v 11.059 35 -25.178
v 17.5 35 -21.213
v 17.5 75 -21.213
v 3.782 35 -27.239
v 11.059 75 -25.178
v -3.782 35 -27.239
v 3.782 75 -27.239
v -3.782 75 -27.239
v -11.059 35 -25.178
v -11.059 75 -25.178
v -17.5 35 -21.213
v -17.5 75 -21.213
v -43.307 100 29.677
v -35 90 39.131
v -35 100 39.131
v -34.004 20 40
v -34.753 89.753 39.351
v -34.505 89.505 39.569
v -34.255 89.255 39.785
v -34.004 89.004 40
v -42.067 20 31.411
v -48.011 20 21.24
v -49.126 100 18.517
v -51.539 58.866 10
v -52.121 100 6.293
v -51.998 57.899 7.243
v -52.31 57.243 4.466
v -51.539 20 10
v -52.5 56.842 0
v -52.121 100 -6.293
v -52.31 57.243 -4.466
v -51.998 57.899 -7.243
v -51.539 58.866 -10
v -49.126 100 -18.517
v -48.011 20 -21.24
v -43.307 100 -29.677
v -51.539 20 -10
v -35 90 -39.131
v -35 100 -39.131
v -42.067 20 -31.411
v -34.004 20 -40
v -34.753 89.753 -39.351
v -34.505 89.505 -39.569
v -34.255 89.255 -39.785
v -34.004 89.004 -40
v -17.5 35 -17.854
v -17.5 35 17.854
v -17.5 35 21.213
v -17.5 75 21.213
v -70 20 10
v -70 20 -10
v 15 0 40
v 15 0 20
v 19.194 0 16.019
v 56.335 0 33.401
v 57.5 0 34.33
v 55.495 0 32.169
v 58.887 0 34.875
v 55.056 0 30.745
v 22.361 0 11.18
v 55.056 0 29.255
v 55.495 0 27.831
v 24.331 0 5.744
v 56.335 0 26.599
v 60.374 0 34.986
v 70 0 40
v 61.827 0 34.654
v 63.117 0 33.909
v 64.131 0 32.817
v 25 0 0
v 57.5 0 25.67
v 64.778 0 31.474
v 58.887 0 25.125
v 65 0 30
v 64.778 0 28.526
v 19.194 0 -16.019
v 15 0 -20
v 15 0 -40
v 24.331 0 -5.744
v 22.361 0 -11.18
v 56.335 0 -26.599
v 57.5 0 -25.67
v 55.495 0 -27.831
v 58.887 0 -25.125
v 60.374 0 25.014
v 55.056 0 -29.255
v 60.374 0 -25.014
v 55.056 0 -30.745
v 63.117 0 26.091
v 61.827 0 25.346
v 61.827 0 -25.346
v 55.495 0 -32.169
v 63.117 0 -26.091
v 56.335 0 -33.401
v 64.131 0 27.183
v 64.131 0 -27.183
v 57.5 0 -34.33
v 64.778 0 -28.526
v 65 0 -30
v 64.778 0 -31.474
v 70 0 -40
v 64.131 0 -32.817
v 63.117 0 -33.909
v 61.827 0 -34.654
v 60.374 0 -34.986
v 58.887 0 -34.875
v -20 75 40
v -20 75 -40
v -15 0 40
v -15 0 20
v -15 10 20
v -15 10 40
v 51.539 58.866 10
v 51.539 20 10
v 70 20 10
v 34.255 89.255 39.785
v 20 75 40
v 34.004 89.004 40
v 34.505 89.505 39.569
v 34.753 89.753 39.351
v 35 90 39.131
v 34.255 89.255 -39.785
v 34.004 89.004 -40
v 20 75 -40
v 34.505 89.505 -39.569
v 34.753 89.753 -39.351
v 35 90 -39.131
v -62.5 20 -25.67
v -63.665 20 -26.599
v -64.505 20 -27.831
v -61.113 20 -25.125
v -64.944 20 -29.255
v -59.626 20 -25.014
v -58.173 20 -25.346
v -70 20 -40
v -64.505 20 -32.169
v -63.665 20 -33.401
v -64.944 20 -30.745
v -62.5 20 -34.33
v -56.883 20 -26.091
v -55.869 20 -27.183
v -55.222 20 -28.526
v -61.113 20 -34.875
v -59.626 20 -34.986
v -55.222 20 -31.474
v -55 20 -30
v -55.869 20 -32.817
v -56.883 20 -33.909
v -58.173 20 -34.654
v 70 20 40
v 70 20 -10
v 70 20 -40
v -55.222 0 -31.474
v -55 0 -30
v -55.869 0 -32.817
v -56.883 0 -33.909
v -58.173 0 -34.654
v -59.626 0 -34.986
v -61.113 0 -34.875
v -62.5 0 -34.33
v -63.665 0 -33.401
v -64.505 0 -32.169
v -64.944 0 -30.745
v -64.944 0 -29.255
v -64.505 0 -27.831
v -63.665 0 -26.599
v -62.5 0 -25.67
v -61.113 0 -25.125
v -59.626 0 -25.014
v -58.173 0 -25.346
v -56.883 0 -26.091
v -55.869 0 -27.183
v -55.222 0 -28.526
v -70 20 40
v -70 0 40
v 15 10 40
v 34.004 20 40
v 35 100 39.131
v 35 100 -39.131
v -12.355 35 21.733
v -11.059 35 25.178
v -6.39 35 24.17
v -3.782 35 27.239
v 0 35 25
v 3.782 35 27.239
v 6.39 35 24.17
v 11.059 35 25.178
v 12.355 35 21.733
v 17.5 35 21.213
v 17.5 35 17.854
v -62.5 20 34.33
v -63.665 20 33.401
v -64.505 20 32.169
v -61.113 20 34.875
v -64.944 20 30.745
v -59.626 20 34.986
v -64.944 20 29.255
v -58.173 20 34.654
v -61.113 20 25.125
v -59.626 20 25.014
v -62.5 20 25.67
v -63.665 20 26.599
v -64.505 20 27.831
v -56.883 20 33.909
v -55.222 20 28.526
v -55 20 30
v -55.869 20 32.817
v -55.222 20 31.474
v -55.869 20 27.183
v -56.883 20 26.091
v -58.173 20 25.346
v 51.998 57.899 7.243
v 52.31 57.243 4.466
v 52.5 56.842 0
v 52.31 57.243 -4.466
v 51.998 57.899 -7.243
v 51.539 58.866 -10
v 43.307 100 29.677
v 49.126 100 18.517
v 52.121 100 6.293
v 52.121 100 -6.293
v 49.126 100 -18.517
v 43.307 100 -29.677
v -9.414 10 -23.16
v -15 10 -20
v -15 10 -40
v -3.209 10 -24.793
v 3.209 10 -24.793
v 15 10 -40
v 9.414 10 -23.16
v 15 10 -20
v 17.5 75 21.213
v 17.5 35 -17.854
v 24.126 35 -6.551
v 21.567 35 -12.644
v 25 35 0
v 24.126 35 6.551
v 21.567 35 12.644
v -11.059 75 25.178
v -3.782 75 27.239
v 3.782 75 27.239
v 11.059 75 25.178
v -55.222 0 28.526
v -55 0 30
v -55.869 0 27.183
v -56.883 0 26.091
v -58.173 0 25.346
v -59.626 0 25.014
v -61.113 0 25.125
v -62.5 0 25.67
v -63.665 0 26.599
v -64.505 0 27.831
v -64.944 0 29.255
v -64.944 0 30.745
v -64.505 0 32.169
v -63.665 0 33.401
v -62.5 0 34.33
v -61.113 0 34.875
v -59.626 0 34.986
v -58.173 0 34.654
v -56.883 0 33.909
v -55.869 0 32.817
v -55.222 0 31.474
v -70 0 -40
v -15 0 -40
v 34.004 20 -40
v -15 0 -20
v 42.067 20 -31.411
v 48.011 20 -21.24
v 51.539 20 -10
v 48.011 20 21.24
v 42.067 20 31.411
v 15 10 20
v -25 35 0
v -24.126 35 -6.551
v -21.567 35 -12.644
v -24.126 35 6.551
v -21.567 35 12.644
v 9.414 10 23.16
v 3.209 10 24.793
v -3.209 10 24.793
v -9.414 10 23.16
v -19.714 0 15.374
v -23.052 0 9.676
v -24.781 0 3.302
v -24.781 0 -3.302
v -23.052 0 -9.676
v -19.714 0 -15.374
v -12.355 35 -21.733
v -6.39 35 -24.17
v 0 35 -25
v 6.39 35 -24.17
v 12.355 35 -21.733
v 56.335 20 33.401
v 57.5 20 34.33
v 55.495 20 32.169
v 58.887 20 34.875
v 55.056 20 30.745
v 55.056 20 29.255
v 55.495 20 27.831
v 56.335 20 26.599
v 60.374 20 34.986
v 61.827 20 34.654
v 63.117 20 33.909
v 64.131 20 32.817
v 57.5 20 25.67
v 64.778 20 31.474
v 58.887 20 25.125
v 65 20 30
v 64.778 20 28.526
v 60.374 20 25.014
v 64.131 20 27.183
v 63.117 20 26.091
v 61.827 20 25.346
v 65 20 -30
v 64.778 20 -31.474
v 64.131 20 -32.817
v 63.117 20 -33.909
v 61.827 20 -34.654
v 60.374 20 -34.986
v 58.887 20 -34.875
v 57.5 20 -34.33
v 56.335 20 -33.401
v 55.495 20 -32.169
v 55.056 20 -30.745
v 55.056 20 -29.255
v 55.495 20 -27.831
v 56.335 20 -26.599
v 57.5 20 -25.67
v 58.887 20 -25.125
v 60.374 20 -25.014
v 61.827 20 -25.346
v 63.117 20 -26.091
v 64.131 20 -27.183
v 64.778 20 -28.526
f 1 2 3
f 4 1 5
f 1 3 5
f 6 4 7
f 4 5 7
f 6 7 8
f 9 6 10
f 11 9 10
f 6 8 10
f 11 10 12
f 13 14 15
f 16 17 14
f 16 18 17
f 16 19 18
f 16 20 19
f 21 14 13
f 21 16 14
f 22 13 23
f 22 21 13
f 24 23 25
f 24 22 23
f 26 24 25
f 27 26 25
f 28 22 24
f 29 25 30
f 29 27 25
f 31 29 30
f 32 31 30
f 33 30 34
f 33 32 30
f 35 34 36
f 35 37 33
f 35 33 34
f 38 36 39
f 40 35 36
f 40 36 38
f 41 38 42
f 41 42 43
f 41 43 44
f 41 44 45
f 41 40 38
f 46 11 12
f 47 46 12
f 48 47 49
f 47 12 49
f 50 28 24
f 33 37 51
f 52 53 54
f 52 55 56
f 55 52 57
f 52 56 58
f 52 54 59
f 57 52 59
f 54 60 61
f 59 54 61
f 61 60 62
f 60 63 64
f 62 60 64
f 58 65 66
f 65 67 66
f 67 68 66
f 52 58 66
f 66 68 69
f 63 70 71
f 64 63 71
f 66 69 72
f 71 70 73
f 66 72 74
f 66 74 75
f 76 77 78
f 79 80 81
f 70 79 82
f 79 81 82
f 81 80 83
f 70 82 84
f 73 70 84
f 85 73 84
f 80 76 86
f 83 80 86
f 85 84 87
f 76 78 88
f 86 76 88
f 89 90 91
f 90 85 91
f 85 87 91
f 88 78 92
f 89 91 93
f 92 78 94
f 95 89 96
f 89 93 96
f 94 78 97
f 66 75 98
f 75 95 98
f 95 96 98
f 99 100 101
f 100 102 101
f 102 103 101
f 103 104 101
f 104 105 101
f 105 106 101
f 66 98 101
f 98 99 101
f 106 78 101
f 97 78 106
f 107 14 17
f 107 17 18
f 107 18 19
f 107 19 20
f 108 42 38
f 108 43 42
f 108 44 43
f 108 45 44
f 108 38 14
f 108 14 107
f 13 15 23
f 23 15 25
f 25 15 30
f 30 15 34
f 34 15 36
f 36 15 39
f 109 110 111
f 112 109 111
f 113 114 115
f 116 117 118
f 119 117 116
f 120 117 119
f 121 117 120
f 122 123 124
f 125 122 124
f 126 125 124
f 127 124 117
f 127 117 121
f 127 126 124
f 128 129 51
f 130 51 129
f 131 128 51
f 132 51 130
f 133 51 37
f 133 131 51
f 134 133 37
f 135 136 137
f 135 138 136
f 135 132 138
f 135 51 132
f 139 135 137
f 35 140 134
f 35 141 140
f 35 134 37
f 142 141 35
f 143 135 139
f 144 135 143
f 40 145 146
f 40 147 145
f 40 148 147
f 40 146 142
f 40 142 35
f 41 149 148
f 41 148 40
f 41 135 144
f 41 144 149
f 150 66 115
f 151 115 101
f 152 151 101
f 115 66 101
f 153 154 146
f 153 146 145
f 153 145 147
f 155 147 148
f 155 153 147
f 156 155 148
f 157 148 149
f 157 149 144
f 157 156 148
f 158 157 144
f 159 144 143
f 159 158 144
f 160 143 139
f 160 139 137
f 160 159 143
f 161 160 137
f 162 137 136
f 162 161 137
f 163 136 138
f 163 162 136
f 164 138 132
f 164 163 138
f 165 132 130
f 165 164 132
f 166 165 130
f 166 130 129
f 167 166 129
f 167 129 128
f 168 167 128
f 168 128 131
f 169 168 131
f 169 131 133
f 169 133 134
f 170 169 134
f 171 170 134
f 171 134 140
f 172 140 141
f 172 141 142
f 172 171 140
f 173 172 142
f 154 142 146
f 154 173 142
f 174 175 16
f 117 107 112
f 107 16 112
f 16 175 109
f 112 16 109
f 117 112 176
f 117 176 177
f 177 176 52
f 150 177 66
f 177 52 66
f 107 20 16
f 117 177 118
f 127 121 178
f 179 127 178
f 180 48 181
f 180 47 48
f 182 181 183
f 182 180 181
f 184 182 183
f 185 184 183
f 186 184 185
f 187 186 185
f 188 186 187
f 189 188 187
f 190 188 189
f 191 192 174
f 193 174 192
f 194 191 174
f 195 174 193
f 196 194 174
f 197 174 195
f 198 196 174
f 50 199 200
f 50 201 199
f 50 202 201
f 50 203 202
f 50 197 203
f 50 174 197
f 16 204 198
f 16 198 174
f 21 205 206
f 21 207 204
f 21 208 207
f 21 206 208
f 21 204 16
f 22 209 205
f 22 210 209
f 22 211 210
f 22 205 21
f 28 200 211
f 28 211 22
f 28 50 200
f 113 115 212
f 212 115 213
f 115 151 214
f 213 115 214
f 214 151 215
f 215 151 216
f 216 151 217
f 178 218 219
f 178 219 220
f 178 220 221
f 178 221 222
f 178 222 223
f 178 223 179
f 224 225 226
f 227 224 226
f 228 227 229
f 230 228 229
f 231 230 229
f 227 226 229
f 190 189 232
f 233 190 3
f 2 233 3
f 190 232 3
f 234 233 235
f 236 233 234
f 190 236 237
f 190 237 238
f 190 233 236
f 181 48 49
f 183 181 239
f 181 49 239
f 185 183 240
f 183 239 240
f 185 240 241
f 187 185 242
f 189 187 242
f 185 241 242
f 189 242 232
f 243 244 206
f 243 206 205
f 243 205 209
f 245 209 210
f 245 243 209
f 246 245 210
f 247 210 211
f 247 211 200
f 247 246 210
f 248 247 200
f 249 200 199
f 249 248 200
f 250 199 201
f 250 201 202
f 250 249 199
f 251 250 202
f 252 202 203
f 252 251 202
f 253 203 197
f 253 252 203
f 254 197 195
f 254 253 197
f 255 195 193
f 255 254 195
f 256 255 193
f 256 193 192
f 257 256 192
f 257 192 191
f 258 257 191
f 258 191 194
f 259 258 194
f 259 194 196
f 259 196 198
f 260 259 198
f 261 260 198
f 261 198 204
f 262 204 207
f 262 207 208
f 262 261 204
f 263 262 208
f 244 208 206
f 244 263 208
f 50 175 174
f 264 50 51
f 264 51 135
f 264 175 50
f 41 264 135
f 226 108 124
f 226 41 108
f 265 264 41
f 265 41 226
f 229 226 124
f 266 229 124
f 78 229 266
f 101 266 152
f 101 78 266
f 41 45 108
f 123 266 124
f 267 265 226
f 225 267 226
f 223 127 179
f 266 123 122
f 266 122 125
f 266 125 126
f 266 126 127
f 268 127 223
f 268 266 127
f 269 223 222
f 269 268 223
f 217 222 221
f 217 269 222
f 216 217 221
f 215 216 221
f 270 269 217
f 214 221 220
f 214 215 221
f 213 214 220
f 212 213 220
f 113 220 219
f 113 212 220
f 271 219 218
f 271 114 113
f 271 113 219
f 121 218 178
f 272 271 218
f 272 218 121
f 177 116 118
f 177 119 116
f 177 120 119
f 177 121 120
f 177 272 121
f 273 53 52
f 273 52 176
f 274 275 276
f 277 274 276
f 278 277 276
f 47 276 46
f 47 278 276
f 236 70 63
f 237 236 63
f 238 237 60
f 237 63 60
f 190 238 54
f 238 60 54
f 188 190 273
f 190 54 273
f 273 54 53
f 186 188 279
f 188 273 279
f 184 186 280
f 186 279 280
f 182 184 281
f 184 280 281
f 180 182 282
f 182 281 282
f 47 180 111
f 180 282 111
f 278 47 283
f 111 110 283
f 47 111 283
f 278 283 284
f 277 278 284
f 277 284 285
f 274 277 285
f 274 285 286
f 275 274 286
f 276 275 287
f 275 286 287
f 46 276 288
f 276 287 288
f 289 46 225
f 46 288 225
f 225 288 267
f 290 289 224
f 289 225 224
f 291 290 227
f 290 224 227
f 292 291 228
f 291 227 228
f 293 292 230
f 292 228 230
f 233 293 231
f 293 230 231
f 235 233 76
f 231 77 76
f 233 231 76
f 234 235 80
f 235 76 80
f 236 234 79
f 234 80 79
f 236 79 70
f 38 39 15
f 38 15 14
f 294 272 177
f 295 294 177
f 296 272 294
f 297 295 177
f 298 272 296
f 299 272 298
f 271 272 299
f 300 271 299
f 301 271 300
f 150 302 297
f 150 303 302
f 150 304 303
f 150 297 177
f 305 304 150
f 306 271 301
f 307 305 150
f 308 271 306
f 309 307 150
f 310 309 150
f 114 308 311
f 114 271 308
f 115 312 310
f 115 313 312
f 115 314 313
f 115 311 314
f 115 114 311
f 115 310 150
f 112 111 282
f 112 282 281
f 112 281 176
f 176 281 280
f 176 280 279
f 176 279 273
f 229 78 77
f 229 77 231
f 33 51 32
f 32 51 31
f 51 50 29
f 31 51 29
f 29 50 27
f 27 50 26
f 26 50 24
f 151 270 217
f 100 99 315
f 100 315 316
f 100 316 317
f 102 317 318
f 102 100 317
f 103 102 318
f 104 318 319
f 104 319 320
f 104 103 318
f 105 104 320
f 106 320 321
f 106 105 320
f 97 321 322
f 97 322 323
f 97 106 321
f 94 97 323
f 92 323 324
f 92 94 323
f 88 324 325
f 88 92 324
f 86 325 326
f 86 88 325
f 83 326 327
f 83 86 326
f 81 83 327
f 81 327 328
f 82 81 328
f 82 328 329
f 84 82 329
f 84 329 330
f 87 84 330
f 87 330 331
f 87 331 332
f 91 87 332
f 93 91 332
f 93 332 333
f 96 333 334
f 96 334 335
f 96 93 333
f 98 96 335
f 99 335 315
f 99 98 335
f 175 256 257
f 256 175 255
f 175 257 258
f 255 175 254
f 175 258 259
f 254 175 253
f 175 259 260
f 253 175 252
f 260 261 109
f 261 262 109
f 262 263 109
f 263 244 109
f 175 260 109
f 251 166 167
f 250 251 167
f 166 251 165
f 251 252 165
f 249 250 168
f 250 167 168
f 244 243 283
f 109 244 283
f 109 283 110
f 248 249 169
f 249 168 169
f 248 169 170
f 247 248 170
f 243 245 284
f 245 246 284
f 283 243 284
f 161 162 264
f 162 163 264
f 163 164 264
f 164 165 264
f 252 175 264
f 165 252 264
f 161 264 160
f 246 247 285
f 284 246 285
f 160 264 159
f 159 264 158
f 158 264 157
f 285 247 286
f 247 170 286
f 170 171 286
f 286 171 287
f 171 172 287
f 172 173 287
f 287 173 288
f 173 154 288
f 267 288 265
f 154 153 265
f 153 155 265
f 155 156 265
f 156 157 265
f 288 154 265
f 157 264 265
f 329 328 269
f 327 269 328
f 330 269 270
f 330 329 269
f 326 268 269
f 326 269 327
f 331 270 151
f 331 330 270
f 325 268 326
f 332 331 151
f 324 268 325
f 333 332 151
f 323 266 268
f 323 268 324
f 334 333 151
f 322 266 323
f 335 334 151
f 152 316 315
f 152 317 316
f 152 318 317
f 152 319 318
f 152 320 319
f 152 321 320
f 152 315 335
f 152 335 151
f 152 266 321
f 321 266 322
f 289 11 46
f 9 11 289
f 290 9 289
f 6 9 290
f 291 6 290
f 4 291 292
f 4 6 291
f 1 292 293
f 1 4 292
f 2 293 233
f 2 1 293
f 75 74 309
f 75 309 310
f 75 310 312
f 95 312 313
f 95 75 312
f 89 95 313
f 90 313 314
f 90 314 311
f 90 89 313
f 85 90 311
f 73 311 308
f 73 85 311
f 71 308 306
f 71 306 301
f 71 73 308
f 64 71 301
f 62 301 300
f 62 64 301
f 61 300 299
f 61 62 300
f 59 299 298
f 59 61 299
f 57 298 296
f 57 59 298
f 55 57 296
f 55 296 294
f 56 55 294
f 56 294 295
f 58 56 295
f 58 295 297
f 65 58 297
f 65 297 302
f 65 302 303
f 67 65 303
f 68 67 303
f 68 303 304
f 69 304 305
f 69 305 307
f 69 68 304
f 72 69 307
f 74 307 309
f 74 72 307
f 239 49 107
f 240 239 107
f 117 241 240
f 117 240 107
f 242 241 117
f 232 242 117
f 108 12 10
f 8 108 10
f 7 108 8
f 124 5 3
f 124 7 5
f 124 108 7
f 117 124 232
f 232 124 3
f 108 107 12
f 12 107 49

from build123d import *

# Parameters (mm, degrees)
SKETCH_1_W               = 140
SKETCH_1_H               = 80
SKETCH_1_R               = 5
EXTRUDE_1_DEPTH          = 20
EXTRUDE_2_DEPTH          = 80
CUT_EXTRUDE_1_DEPTH      = 65
CUT_EXTRUDE_2_DEPTH      = 41
CUT_EXTRUDE_2_DEPTH_BACK = 41
SKETCH_6_W               = 30
SKETCH_6_H               = 10
CUT_EXTRUDE_3_DEPTH      = 41
CUT_EXTRUDE_3_DEPTH_BACK = 41
SKETCH_7_R               = 25
CUT_EXTRUDE_4_DEPTH      = 35
EXTRUDE_3_DEPTH          = 10
EXTRUDE_3_DEPTH_BACK     = 10


with BuildPart() as part:
    # Эскиз1 → Бобышка-Вытянуть1 (new body)
    with BuildSketch(Plane(origin=(0, 0, 0), x_dir=(1, 0, 0), z_dir=(0, 1, 0))):
        Rectangle(SKETCH_1_W, SKETCH_1_H)
        with Locations((-60, 30)):
            Circle(SKETCH_1_R, mode=Mode.SUBTRACT)
        with Locations((60, 30)):
            Circle(SKETCH_1_R, mode=Mode.SUBTRACT)
        with Locations((60, -30)):
            Circle(SKETCH_1_R, mode=Mode.SUBTRACT)
        with Locations((-60, -30)):
            Circle(SKETCH_1_R, mode=Mode.SUBTRACT)
    extrude(amount=EXTRUDE_1_DEPTH)

    # Эскиз2 → Бобышка-Вытянуть2 (add)
    with BuildSketch(Plane(origin=(0, 20, 0), x_dir=(1, 0, 0), z_dir=(0, 1, 0))):
        with BuildLine():
            Line((-34.003676272, 40), (34.003676272, 40))
            ThreePointArc((34.003676272, 40), (52.5, 0), (34.003676272, -40))
            Line((34.003676272, -40), (-34.003676272, -40))
            ThreePointArc((-34.003676272, -40), (-52.5, 0), (-34.003676272, 40))
        make_face()
    extrude(amount=EXTRUDE_2_DEPTH)

    # Эскиз3 → Вырез-Вытянуть1 (cut)
    with BuildSketch(Plane(origin=(0, 100, 0), x_dir=(1, 0, 0), z_dir=(0, 1, 0))):
        with BuildLine():
            Line((17.5, -21.213203436), (17.5, 21.213203436))
            ThreePointArc((17.5, 21.213203436), (0, 27.5), (-17.5, 21.213203436))
            Line((-17.5, 21.213203436), (-17.5, -21.213203436))
            ThreePointArc((-17.5, -21.213203436), (0, -27.5), (17.5, -21.213203436))
        make_face()
    extrude(amount=-CUT_EXTRUDE_1_DEPTH, mode=Mode.SUBTRACT)

    # Эскиз5 → Вырез-Вытянуть2 (cut, two sides)
    with BuildSketch(Plane.XY) as cut_extrude_2_sk:
        Polygon((-20, 75), (20, 75), (35, 90), (35, 100), (-35, 100), (-35, 90), align=None)
    extrude(amount=CUT_EXTRUDE_2_DEPTH, mode=Mode.SUBTRACT)
    extrude(cut_extrude_2_sk.sketch, amount=-CUT_EXTRUDE_2_DEPTH_BACK, mode=Mode.SUBTRACT)

    # Эскиз6 → Вырез-Вытянуть3 (cut, two sides)
    with BuildSketch(Plane.XY) as cut_extrude_3_sk:
        with Locations((0, 5)):
            Rectangle(SKETCH_6_W, SKETCH_6_H)
    extrude(amount=CUT_EXTRUDE_3_DEPTH, mode=Mode.SUBTRACT)
    extrude(cut_extrude_3_sk.sketch, amount=-CUT_EXTRUDE_3_DEPTH_BACK, mode=Mode.SUBTRACT)

    # Эскиз7 → Вырез-Вытянуть4 (cut)
    with BuildSketch(Plane.XZ):
        Circle(SKETCH_7_R)
    extrude(amount=-CUT_EXTRUDE_4_DEPTH, mode=Mode.SUBTRACT)

    # Эскиз8 → Бобышка-Вытянуть3 (add, two sides)
    with BuildSketch(Plane.XY) as extrude_3_sk:
        Polygon((-70, 20), (-51, 60), (-51, 20), align=None)
        Polygon((51, 60), (51, 20), (70, 20), align=None)
    extrude(amount=EXTRUDE_3_DEPTH)
    extrude(extrude_3_sk.sketch, amount=-EXTRUDE_3_DEPTH_BACK)


solid = part.part
